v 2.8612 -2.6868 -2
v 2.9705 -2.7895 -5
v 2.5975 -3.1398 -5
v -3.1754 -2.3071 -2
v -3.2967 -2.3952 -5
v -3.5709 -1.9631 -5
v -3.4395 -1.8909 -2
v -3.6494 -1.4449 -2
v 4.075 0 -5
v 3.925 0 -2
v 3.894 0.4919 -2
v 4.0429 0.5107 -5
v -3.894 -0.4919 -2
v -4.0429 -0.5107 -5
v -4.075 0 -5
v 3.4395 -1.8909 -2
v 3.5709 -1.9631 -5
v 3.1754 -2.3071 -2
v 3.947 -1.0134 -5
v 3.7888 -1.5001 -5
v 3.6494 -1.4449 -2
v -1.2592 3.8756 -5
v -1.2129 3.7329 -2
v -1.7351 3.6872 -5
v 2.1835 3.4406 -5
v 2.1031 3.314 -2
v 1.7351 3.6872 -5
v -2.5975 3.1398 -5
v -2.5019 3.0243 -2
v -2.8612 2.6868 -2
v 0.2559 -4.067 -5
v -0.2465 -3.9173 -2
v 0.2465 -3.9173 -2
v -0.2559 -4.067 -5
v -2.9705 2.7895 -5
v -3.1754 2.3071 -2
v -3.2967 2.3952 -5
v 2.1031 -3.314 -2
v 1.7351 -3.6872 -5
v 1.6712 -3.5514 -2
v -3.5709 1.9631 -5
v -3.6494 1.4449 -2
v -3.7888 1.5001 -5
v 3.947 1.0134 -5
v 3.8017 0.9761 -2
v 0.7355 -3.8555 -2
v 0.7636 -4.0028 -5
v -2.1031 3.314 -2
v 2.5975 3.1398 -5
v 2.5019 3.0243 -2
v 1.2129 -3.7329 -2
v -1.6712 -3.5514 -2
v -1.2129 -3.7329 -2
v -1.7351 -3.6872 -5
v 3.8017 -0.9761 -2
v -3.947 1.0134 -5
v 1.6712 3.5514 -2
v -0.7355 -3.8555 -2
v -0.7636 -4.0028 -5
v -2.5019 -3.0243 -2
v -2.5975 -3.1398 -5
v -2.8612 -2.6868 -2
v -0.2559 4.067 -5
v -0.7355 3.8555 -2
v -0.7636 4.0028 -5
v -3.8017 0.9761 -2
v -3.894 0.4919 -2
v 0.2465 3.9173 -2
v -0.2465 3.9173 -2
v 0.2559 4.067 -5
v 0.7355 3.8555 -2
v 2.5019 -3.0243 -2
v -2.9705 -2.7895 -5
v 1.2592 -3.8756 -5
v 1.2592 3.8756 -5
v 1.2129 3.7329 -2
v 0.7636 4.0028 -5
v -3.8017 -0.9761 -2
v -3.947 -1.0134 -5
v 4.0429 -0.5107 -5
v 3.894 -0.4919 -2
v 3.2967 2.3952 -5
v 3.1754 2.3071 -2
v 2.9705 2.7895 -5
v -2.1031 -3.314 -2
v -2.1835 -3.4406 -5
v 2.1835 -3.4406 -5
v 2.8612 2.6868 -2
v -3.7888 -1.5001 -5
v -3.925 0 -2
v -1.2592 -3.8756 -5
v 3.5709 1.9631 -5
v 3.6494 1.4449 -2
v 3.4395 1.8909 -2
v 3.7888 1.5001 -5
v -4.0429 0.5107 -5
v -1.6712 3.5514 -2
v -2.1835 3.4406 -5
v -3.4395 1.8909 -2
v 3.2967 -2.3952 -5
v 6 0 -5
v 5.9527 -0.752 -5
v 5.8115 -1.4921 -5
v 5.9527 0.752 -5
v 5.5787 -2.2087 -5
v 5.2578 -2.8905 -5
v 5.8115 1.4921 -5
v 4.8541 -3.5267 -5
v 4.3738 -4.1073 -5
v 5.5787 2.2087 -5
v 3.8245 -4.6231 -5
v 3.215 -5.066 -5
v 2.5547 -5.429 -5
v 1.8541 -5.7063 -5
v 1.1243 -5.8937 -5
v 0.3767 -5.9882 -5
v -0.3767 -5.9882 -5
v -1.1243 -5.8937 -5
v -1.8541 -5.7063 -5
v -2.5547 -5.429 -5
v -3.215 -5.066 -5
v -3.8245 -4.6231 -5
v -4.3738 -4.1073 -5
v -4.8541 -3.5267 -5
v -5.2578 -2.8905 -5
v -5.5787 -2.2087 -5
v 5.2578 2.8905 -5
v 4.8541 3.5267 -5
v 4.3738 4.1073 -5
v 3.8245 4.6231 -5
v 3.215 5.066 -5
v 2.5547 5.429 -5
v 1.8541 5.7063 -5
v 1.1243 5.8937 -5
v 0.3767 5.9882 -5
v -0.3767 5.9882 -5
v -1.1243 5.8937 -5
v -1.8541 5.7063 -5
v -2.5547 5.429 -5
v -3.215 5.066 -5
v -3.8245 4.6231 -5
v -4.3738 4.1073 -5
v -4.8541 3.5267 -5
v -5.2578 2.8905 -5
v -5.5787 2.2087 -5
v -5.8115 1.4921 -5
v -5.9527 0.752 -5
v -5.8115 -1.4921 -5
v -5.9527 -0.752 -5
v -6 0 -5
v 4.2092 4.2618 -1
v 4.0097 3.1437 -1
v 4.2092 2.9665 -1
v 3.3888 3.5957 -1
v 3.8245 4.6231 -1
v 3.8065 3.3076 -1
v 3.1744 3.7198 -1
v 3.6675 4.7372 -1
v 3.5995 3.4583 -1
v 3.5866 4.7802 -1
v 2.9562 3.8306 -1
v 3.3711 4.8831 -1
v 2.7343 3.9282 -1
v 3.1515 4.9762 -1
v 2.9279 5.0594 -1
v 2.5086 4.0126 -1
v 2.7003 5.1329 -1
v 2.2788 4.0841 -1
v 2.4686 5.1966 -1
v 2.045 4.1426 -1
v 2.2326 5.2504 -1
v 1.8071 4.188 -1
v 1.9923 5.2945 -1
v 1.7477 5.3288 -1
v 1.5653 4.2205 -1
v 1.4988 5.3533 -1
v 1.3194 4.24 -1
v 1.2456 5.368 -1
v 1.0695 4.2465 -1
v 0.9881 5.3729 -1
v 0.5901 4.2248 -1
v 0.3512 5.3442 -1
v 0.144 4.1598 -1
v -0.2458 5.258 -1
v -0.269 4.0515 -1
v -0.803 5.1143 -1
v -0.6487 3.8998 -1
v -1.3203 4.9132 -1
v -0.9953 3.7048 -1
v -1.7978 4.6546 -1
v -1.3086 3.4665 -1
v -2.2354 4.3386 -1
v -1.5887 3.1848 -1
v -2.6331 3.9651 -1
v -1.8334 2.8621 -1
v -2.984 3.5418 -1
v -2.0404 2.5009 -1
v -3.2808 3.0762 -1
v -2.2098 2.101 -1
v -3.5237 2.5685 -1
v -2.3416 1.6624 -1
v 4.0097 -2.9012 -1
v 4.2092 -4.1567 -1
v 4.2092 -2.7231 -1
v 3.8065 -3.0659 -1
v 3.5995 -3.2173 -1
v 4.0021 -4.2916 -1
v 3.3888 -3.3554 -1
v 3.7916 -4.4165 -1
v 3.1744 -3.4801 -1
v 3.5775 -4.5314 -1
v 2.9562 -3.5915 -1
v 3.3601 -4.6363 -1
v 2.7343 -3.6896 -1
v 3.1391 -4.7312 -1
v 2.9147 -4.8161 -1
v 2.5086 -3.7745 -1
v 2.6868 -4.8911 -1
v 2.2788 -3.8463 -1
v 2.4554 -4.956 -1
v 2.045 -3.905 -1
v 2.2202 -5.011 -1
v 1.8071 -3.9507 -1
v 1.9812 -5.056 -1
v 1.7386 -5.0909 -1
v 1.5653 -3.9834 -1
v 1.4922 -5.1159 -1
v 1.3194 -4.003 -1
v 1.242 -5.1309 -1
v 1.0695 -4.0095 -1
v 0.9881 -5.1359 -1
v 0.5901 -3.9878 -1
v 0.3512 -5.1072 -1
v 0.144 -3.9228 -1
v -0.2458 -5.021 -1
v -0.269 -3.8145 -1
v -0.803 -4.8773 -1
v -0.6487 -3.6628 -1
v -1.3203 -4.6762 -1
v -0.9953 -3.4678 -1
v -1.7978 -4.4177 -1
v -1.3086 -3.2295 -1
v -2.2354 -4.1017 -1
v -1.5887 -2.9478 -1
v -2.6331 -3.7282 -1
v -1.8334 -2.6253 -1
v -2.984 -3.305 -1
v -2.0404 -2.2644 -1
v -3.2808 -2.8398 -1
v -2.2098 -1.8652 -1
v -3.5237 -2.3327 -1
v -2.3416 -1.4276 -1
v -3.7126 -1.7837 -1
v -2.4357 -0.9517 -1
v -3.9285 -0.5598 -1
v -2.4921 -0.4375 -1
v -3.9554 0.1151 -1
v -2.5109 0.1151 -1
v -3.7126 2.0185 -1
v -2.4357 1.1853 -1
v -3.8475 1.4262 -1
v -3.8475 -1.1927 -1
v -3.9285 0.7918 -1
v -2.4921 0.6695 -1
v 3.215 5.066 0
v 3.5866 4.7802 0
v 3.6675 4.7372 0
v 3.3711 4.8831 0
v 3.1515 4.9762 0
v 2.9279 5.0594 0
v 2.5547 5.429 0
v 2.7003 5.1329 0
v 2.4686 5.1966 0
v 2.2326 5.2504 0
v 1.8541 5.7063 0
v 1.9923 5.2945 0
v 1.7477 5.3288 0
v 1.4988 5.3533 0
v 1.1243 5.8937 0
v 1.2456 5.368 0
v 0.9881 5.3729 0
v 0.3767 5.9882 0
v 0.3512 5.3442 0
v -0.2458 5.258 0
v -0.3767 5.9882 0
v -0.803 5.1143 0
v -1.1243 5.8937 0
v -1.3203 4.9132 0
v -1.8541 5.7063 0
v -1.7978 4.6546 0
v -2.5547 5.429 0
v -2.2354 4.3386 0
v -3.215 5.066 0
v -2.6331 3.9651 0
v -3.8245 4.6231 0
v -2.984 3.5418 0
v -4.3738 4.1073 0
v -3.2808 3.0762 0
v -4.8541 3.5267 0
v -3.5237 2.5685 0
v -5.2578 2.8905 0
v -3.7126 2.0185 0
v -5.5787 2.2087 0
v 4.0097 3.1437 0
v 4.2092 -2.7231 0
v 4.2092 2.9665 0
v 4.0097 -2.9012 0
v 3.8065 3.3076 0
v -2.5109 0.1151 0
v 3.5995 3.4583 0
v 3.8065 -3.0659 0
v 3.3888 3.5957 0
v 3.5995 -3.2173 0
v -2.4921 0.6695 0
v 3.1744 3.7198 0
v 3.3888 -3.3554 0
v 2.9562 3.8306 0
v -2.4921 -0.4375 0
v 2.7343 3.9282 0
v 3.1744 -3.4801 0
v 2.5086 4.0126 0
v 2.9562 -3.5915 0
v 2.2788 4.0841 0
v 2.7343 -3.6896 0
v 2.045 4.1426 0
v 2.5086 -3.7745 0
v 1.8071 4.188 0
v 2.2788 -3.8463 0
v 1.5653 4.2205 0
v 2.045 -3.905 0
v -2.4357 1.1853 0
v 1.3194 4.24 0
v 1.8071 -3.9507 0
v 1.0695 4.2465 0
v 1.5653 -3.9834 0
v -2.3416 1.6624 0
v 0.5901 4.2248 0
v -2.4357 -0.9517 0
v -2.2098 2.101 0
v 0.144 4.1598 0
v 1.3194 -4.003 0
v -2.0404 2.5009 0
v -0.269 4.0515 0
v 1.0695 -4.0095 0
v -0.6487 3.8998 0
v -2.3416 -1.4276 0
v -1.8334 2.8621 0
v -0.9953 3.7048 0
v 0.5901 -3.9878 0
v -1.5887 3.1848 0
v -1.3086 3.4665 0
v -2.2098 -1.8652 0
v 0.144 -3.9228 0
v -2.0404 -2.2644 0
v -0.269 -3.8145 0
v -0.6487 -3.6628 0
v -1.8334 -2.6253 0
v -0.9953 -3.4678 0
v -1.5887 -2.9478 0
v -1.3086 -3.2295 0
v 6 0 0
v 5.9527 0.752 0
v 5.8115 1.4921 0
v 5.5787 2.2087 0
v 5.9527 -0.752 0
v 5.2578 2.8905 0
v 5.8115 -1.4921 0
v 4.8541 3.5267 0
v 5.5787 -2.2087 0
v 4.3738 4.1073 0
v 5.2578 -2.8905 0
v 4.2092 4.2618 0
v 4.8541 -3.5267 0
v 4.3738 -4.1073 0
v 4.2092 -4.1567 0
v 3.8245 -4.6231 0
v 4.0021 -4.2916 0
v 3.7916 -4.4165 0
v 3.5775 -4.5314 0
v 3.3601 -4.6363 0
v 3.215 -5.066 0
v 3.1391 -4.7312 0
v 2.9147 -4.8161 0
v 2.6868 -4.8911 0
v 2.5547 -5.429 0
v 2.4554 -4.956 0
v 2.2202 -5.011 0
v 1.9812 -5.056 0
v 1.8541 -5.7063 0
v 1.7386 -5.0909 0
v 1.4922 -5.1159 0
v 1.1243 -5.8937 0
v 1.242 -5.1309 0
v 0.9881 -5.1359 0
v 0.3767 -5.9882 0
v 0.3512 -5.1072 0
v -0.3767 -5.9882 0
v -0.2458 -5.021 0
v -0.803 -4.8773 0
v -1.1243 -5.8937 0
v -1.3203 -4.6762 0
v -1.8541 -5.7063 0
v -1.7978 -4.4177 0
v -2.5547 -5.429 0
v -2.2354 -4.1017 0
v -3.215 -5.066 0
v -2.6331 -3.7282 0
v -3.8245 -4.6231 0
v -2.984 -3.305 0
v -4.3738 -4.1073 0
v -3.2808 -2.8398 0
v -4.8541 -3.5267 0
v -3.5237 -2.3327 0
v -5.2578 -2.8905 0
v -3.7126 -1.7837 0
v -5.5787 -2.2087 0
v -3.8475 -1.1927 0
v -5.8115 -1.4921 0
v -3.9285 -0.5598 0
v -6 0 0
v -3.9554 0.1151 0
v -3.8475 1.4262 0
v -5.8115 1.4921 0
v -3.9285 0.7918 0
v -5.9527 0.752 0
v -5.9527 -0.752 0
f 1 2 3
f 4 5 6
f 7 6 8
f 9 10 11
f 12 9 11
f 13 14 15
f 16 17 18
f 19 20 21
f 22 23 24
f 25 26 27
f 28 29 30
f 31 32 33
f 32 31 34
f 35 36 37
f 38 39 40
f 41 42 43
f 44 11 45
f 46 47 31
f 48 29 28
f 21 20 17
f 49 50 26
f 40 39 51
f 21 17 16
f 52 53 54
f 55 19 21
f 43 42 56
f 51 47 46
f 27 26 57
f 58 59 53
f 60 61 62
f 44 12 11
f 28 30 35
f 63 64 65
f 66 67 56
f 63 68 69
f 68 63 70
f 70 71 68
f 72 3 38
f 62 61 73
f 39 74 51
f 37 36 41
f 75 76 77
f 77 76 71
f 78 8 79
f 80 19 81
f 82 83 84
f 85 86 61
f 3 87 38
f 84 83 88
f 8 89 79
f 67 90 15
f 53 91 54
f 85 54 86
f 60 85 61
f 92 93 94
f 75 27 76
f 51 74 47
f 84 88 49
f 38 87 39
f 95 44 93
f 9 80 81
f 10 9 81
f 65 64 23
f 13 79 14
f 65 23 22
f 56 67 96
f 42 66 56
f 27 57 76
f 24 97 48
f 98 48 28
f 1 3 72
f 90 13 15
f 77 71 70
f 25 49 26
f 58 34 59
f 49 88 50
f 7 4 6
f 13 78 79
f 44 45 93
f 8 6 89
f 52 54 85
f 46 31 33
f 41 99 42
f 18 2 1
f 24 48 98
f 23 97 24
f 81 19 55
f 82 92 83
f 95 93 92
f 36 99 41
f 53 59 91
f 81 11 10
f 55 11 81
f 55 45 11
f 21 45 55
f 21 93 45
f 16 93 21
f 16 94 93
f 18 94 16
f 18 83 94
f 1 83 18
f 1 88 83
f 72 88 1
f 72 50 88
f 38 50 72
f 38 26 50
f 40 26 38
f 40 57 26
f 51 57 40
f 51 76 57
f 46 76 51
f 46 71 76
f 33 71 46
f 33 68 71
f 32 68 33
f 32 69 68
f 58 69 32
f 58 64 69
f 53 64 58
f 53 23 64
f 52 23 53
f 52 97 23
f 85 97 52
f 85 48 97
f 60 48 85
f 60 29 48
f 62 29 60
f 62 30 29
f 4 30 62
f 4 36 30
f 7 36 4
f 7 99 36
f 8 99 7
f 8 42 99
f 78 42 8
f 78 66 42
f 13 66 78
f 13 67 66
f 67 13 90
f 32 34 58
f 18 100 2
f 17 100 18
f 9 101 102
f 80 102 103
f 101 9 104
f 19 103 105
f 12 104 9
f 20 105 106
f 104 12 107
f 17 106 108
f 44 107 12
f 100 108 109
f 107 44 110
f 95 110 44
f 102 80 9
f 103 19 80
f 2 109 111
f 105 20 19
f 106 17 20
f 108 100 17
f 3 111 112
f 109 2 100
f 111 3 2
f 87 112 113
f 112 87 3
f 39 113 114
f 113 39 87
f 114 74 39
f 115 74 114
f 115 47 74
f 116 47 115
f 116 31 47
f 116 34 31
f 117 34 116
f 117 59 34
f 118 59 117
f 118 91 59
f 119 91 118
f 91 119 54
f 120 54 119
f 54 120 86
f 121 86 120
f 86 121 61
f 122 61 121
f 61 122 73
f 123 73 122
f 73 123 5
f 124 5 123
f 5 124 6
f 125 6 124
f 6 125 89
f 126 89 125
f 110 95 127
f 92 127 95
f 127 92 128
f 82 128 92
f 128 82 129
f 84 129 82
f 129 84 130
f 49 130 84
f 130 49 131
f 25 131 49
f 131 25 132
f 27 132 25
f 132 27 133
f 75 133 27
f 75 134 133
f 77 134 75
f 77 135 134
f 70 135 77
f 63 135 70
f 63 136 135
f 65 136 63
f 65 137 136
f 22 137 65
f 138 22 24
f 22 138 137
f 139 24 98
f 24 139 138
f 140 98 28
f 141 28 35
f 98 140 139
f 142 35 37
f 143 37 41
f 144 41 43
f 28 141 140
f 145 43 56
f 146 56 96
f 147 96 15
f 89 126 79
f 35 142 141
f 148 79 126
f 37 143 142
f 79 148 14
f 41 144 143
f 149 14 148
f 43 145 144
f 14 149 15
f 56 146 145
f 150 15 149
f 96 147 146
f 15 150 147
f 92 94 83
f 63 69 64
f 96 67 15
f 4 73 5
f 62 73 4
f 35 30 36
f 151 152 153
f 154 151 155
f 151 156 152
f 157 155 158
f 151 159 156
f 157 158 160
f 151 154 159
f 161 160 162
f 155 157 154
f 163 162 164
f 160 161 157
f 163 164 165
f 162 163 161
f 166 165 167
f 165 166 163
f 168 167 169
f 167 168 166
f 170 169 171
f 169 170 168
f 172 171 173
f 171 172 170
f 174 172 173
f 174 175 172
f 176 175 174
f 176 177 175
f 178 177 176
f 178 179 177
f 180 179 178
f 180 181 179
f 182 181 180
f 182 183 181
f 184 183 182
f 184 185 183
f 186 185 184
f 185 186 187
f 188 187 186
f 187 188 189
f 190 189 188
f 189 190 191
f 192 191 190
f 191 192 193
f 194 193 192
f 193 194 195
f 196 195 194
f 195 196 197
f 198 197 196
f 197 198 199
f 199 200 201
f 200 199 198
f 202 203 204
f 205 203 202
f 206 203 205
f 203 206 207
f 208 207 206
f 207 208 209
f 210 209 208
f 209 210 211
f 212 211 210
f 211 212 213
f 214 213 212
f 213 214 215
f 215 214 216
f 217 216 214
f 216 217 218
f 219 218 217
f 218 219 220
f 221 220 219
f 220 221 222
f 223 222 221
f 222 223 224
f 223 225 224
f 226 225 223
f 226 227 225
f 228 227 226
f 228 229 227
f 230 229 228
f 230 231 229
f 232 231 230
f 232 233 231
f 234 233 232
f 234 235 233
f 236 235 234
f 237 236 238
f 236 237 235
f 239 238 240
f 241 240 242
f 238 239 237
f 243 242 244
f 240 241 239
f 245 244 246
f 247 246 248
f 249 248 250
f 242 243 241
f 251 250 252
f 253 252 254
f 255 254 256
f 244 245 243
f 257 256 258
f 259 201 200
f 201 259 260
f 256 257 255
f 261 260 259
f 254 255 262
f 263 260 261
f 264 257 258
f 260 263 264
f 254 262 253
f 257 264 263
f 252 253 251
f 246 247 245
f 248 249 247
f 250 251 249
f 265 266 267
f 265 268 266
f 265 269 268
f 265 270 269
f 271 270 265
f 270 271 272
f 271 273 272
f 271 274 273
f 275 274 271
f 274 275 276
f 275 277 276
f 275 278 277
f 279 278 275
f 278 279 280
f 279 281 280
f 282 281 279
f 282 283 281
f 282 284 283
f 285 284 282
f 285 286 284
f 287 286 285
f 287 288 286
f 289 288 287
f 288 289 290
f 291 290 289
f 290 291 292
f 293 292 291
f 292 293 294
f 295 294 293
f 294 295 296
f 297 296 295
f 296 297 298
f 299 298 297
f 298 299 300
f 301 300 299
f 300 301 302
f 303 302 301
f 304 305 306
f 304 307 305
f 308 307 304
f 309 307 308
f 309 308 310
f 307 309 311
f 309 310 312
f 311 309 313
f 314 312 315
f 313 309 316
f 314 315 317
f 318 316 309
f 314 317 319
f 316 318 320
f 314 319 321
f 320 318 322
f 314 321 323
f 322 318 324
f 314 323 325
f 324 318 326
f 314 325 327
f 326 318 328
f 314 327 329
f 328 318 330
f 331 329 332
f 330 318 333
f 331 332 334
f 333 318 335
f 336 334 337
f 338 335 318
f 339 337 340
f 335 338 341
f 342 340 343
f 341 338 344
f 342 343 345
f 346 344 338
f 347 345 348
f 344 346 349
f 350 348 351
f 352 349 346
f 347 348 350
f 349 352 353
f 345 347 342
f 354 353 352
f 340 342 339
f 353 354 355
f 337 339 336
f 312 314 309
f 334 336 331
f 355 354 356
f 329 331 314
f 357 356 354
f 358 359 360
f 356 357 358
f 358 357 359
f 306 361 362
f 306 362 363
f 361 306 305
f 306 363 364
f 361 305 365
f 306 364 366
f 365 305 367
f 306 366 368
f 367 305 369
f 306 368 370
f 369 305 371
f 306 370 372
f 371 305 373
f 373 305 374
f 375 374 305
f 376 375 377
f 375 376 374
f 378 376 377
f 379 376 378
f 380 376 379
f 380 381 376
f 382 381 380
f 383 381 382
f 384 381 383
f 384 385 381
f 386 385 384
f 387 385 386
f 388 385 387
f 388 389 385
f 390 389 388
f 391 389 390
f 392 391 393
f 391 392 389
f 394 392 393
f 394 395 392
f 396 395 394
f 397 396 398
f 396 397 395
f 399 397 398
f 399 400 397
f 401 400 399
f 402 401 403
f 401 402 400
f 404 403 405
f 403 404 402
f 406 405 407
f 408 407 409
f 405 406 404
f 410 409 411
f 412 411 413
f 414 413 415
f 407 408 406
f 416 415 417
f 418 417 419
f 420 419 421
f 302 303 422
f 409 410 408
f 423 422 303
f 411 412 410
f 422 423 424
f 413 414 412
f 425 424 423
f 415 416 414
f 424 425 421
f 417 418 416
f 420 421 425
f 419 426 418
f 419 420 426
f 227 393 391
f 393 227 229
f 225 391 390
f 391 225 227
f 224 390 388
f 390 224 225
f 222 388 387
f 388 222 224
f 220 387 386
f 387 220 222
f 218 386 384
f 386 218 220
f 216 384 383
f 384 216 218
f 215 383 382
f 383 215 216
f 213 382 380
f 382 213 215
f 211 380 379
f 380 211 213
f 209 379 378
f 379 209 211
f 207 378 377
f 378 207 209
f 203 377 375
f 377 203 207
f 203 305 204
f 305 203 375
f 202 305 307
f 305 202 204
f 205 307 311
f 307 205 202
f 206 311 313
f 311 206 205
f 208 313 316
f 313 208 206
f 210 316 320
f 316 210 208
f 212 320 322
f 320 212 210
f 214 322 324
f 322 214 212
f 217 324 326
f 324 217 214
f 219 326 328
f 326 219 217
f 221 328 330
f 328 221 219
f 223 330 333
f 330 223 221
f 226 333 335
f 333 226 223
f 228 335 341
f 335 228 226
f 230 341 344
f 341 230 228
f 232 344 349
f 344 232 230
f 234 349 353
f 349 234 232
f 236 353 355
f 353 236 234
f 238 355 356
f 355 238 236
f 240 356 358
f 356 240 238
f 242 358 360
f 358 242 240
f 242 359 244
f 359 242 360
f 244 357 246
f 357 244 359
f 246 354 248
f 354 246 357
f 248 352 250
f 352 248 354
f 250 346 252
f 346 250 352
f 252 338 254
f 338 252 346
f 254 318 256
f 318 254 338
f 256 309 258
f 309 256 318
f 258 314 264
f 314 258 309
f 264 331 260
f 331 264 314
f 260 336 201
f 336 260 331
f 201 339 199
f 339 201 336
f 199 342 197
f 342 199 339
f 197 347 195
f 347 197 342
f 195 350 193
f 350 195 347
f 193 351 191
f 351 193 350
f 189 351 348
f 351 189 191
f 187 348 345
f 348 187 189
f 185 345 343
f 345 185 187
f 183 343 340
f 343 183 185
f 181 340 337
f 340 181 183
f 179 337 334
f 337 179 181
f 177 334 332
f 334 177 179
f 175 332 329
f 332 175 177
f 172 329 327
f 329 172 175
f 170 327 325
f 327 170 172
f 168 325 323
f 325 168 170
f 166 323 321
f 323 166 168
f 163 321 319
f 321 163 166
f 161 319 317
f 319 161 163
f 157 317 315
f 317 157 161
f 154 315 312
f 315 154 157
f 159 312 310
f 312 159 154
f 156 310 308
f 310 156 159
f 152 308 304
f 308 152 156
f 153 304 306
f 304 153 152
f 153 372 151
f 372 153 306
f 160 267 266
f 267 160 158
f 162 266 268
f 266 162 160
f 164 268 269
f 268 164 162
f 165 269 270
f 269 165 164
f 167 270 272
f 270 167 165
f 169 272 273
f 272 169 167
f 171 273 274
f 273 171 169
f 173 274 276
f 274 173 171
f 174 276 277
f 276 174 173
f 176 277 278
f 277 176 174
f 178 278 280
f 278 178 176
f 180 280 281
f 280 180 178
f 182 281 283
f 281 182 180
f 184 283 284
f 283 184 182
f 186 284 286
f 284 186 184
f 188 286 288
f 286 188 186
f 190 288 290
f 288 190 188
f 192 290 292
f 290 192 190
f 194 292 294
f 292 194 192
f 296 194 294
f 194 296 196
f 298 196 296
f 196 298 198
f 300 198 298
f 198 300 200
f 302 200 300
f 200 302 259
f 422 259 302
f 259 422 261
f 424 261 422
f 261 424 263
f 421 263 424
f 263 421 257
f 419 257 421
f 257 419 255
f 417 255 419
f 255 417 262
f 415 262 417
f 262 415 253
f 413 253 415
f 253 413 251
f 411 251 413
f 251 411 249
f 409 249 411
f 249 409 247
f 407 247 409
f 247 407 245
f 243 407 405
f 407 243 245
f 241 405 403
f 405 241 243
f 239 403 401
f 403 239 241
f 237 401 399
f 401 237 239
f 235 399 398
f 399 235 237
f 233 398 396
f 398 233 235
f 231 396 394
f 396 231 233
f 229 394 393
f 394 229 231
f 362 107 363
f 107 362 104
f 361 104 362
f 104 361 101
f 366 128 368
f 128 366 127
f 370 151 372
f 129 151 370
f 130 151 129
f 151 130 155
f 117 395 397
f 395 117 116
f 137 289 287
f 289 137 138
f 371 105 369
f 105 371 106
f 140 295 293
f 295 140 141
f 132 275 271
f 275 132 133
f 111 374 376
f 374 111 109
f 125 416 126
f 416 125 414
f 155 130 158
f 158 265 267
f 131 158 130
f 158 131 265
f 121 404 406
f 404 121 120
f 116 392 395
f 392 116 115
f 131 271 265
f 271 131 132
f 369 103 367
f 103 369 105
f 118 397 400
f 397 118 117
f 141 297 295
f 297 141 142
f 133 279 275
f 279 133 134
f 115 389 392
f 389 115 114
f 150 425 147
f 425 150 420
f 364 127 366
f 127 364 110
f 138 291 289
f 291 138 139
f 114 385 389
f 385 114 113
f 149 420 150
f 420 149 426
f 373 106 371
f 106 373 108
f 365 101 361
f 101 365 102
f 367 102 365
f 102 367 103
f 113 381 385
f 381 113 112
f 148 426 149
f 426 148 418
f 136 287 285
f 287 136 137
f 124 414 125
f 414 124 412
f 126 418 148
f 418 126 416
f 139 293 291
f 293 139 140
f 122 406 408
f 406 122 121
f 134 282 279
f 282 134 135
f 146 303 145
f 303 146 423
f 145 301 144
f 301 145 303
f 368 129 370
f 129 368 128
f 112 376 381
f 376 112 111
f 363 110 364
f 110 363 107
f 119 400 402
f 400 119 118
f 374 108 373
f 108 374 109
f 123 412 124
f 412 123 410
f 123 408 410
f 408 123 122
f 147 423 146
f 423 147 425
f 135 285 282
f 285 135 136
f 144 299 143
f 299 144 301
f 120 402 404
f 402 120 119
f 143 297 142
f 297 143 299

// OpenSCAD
$fn = 50;

difference() {
	union() {
		translate(v = [0, 0, -5.0]) {
			cylinder(h = 5, r = 6.0);
		}
	}
	union() {
		#translate(v = [0, 0, -5.0]) {
			cylinder(h = 3, r1 = 4.075, r2 = 3.925);
		}
		translate(v = [0, 0, -1]) {
			linear_extrude(height = 1) {
				text(font = "Impact", halign = "center", size = 10, text = "C", valign = "center");
			}
		}
	}
}
